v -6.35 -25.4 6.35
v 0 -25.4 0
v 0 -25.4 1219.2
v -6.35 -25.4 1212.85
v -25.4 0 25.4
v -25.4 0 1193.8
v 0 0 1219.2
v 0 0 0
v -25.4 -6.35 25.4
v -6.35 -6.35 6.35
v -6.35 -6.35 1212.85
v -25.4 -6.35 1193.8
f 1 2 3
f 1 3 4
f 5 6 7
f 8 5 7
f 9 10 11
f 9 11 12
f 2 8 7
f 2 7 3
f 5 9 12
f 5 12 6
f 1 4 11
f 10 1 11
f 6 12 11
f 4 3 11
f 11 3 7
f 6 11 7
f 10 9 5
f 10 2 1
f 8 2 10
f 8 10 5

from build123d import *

# Parameters (mm, degrees)
BOSS_EXTRUDE1_DEPTH = 1219.2
CHAMFER1_SIZE       = 25.4


with BuildPart() as part:
    # Sketch1 → Boss-Extrude1 (new body)
    with BuildSketch(Plane.XY):
        Polygon((0, 0), (0, -25.4), (-6.35, -25.4), (-6.35, -6.35), (-25.4, -6.35), (-25.4, 0), align=None)
    extrude(amount=BOSS_EXTRUDE1_DEPTH)

    # Chamfer1
    chamfer1_edges = [part.edges().sort_by_distance(p)[0] for p in [
        (-25.4, -3.175, 0),
        (-25.4, -3.175, 1219.2),
    ]]
    chamfer(chamfer1_edges, length=CHAMFER1_SIZE - 0.0001)  # a hair under: the kernel refuses the full size


solid = part.part
